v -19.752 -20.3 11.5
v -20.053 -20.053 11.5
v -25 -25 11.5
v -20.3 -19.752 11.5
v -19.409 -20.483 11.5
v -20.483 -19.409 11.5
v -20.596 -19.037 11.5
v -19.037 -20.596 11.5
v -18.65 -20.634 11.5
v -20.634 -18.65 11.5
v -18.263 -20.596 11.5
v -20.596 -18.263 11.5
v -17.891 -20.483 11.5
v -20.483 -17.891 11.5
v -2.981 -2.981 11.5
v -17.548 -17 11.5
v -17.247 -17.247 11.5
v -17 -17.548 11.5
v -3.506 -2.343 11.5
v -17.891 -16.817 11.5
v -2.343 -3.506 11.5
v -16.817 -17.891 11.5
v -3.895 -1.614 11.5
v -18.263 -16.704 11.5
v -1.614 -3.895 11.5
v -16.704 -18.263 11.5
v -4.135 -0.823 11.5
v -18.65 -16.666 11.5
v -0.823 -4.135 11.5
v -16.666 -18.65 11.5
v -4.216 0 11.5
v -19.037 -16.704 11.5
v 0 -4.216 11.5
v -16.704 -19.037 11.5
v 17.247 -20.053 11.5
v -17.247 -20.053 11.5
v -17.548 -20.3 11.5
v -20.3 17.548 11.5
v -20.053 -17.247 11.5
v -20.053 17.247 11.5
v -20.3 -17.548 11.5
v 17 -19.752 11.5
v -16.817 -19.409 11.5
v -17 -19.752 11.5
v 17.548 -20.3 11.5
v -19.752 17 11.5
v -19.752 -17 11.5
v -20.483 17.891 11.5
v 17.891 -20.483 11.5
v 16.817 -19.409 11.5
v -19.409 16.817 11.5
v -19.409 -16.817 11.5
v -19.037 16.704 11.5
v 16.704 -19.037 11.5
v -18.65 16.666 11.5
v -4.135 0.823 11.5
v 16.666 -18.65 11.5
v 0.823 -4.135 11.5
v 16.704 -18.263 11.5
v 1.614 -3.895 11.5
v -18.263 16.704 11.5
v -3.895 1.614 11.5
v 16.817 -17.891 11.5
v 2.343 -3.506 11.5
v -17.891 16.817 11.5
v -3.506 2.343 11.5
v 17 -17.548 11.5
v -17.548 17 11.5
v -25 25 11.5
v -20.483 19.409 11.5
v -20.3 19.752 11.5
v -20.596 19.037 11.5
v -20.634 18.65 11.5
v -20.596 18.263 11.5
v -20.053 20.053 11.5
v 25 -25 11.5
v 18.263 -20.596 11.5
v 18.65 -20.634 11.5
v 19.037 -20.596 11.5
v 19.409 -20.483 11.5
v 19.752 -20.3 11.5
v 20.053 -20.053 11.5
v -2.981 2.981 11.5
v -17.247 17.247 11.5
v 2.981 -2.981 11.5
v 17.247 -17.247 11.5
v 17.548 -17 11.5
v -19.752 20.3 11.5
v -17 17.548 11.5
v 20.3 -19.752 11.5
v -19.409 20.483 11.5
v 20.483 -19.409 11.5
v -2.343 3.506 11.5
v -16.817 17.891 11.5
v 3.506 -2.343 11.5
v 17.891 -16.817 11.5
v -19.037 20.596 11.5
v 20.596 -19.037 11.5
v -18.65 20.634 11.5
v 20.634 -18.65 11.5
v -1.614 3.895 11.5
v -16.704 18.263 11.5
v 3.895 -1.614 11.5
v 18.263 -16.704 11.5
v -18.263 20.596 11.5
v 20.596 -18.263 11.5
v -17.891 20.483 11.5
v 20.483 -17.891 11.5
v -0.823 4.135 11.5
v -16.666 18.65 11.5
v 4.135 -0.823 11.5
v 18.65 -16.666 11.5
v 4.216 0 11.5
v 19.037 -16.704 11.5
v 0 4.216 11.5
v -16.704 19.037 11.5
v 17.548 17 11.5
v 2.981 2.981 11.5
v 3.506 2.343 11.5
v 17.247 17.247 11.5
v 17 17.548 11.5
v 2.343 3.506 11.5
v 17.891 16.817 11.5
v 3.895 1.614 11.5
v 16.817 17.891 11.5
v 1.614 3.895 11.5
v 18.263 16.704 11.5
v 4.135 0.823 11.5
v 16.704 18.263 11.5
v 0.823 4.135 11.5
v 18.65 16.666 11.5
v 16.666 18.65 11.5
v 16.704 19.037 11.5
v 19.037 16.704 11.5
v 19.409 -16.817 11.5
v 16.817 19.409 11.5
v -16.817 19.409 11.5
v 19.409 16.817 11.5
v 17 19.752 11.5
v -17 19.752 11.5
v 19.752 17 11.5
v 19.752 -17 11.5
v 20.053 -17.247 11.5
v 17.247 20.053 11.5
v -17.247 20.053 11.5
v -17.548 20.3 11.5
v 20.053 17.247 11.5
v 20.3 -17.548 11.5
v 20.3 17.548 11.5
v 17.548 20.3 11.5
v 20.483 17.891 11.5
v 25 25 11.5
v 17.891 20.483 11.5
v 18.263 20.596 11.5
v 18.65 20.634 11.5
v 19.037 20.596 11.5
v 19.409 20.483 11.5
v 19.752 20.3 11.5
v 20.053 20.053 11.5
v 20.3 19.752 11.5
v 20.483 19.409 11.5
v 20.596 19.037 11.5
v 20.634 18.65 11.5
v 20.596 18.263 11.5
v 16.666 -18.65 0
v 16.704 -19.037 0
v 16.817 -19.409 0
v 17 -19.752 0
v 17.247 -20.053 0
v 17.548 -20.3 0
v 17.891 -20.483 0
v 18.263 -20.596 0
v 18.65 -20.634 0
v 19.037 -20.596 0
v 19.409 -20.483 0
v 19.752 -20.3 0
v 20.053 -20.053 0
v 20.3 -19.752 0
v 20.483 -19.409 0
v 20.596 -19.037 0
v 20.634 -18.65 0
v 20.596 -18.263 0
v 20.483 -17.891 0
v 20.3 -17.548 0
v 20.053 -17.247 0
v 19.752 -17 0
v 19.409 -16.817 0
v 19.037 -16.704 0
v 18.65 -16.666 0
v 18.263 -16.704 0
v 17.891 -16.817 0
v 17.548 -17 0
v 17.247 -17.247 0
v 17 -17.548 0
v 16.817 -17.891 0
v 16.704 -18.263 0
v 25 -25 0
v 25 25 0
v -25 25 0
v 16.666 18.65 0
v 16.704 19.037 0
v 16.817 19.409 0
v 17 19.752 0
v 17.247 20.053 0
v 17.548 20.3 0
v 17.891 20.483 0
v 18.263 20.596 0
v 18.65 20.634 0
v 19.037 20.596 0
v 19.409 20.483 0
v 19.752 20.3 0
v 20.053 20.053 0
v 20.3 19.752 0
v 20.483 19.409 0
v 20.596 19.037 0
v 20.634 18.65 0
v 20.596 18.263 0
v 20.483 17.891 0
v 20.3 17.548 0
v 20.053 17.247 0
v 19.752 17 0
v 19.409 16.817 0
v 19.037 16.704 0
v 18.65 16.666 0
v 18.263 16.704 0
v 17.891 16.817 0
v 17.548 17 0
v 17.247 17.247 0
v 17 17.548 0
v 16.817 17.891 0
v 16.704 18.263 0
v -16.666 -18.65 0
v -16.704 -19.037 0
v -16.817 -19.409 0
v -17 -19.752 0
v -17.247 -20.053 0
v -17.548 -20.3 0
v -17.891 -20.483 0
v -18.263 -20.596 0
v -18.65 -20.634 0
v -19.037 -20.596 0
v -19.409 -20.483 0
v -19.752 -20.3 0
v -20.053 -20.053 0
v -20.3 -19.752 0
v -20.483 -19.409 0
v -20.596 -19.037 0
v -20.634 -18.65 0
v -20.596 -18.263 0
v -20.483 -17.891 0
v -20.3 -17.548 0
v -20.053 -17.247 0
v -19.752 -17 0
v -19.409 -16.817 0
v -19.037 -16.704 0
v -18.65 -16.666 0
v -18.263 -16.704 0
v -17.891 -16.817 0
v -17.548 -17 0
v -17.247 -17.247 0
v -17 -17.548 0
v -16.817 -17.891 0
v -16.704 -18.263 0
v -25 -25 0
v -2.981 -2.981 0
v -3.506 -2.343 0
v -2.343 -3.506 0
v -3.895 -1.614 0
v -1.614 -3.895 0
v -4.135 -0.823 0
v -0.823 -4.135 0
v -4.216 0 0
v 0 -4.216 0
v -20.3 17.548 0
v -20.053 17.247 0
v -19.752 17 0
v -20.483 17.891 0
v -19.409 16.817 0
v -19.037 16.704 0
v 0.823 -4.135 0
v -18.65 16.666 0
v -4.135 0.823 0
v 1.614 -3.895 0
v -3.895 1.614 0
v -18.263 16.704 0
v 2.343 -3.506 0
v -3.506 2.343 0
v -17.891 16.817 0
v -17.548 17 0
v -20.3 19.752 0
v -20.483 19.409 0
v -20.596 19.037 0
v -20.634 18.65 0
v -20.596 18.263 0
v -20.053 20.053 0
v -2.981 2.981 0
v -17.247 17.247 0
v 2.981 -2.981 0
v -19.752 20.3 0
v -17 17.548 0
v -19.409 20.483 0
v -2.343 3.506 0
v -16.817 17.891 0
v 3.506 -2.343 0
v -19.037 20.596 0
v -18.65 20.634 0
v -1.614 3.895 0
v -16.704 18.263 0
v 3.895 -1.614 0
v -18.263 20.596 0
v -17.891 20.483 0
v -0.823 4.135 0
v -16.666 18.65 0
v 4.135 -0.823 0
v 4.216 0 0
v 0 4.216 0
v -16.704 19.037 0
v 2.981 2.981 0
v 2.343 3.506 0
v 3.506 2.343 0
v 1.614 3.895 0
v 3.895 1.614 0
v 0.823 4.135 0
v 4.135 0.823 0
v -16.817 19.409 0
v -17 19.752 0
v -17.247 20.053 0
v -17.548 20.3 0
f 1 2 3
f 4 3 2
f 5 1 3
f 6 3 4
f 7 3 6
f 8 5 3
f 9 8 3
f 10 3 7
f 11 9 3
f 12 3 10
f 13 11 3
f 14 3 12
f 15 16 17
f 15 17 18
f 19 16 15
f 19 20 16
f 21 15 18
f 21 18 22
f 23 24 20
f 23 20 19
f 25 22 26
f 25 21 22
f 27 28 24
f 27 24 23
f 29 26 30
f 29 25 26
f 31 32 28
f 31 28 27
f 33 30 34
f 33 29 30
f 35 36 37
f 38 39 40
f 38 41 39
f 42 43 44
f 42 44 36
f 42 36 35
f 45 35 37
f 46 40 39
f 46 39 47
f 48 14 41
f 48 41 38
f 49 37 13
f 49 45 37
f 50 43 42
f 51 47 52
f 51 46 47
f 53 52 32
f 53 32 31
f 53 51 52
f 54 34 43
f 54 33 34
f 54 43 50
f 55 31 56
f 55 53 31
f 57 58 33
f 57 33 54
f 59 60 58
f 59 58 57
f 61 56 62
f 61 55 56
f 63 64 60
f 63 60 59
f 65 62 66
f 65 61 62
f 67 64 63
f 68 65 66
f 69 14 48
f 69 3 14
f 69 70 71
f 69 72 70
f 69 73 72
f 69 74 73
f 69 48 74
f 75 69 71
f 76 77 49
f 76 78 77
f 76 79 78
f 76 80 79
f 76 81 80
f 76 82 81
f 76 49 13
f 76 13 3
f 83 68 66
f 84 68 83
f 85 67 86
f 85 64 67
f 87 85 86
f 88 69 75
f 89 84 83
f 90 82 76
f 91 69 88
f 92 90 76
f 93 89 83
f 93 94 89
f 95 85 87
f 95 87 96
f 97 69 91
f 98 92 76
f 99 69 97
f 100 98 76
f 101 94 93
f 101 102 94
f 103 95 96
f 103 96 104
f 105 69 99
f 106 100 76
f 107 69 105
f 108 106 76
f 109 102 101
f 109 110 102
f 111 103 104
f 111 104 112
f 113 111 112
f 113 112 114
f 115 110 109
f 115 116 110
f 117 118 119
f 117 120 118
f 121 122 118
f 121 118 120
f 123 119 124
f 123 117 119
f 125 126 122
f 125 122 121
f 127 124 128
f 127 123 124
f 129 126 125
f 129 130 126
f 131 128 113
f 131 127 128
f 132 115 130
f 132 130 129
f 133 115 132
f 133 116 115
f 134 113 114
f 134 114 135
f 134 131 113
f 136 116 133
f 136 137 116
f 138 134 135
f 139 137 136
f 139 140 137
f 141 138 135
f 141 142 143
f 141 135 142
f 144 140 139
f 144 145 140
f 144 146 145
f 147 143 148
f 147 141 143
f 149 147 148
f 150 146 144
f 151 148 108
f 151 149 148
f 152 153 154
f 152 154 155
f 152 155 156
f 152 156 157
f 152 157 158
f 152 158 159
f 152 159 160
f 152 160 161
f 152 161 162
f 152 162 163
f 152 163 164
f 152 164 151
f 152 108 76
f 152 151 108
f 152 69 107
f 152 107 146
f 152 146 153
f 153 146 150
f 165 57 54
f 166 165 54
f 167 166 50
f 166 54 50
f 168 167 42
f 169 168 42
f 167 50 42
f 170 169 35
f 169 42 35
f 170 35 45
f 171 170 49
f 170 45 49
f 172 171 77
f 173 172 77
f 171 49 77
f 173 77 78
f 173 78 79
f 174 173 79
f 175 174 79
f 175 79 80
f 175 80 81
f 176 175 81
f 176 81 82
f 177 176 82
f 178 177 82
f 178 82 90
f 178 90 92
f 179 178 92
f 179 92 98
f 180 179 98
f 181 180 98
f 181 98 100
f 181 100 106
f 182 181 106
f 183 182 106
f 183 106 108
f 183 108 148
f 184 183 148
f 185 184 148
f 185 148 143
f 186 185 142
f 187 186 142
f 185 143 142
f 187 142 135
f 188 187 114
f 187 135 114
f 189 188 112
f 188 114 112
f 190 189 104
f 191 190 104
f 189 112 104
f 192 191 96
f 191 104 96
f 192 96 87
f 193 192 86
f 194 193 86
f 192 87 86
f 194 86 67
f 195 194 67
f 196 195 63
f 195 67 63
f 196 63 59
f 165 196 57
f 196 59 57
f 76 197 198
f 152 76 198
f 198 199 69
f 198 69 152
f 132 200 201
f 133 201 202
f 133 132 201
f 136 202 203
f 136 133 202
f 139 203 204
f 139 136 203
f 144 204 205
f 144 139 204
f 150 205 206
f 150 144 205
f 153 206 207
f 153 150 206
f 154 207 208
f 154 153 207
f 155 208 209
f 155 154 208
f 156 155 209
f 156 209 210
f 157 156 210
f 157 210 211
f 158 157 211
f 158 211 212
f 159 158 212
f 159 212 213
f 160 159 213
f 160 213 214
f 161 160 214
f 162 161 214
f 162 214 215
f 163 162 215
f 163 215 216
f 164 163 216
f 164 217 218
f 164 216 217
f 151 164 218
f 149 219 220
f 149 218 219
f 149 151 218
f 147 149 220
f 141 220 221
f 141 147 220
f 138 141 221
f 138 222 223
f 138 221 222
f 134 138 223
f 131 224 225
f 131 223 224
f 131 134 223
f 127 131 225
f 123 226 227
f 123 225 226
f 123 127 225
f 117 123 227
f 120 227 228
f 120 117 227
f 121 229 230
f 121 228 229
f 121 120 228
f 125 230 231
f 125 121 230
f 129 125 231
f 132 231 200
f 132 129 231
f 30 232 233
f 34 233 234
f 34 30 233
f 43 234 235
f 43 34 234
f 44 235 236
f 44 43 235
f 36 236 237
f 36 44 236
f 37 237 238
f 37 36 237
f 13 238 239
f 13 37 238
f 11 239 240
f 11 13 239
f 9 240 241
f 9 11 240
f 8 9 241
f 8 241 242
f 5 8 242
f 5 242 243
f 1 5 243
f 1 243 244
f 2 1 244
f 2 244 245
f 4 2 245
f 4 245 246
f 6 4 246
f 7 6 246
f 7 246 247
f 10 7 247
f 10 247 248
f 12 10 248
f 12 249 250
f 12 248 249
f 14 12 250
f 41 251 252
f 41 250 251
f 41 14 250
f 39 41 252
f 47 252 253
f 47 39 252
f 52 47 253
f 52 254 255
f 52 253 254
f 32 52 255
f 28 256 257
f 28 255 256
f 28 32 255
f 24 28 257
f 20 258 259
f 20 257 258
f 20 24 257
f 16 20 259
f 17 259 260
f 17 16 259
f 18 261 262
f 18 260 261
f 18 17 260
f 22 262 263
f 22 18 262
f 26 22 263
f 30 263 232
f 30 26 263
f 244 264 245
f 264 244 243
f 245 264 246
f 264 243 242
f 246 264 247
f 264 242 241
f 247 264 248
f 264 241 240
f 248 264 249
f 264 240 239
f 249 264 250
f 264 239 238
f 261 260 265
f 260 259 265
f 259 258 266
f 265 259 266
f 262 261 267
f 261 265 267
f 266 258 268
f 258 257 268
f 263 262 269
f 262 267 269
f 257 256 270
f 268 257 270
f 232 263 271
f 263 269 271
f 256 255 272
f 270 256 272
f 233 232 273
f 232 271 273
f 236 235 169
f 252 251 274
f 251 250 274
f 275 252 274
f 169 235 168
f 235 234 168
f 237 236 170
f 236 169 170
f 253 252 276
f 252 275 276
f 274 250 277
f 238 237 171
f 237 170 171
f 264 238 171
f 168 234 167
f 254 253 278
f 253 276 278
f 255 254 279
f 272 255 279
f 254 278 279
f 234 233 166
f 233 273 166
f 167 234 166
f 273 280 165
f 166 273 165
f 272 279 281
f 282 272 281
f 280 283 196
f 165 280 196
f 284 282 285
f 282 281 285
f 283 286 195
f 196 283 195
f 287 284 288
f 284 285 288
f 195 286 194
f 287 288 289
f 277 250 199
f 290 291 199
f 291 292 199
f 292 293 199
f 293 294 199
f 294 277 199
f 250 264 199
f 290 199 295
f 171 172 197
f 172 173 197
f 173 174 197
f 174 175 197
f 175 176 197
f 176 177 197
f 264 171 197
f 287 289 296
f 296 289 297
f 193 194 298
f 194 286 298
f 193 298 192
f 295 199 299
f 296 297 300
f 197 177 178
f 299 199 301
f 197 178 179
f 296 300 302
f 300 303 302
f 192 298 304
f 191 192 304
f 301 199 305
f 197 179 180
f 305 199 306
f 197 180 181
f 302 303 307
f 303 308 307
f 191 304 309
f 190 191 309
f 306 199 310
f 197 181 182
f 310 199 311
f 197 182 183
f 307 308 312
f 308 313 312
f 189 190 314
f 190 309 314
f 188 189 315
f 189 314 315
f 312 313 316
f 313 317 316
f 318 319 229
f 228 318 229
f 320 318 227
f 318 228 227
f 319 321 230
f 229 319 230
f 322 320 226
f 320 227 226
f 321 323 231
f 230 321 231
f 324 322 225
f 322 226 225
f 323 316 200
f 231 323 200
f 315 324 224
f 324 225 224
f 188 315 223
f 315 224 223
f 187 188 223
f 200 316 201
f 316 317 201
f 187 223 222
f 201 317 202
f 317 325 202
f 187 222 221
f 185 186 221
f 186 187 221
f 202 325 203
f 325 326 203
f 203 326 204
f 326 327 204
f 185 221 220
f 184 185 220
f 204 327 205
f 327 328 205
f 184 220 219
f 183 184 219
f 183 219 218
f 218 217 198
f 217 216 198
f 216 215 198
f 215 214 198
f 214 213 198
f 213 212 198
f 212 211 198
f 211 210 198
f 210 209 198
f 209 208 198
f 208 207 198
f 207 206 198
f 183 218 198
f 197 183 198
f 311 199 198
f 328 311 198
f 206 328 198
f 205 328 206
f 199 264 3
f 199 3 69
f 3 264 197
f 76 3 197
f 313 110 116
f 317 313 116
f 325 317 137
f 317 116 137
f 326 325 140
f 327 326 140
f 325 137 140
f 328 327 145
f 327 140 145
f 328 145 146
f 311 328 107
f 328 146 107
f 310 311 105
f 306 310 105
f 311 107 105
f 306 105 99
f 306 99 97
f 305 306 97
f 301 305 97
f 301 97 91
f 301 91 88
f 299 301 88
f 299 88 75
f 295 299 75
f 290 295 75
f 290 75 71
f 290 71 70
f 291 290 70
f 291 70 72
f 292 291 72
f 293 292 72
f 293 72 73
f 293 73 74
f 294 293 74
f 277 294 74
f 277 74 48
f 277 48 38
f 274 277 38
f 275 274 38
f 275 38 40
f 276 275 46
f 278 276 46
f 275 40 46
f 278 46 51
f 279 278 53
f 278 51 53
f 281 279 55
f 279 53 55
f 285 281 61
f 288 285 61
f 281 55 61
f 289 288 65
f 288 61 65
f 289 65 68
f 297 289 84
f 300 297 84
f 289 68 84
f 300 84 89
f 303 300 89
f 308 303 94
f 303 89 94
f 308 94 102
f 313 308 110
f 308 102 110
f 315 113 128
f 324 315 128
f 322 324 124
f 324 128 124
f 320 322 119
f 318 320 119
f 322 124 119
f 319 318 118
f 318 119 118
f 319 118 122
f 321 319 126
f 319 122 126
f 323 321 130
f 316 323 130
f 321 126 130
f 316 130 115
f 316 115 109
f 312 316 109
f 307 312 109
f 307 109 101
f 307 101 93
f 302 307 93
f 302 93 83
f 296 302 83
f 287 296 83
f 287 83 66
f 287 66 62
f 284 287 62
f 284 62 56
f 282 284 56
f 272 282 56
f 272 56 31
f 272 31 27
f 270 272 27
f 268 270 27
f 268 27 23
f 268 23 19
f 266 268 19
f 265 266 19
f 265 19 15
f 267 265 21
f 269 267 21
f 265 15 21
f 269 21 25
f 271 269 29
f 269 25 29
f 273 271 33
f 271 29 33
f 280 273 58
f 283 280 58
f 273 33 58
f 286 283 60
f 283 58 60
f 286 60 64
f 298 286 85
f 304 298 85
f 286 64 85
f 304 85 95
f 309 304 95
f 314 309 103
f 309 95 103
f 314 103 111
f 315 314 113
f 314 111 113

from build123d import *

# Parameters (mm, degrees)
SKETCH1_W               = 50
SKETCH1_H               = 50
BOSS_EXTRUDE1_DEPTH     = 11.5
SKETCH2_R               = 1.984375
CUT_EXTRUDE1_DEPTH      = 12.5
MIRROR2_COPY_1_SKETCH_R = 1.984375
MIRROR2_COPY_1_DEPTH    = 12.5
SKETCH3_R               = 4.2164
CUT_EXTRUDE2_DEPTH      = 12.5


with BuildPart() as part:
    # Sketch1 → Boss-Extrude1 (new body)
    with BuildSketch(Plane.XY):
        Rectangle(SKETCH1_W, SKETCH1_H)
    extrude(amount=BOSS_EXTRUDE1_DEPTH)

    # Sketch2 → Cut-Extrude1 (cut, through all)
    with BuildSketch(Plane.XY.offset(11.5)):
        with Locations((-18.65, 18.65)):
            Circle(SKETCH2_R)
    cut_extrude1 = extrude(amount=-CUT_EXTRUDE1_DEPTH, mode=Mode.SUBTRACT)

    # Mirror1: Cut-Extrude1 across plane
    add(cut_extrude1.mirror(Plane.ZX), mode=Mode.SUBTRACT)

    # Mirror2: Cut-Extrude1 across plane
    add(cut_extrude1.mirror(Plane(origin=(0, 0, 0), x_dir=(0, 0, 1), z_dir=(1, 0, 0))), mode=Mode.SUBTRACT)

    # Mirror2 copy 1 sketch → Mirror2 copy 1 (cut, through all)
    with BuildSketch(Plane(origin=(0, 0, 11.5), x_dir=(-1, 0, 0), z_dir=(0, 0, 1))):
        with Locations((-18.65, 18.65)):
            Circle(MIRROR2_COPY_1_SKETCH_R)
    extrude(amount=-MIRROR2_COPY_1_DEPTH, mode=Mode.SUBTRACT)

    # Sketch3 → Cut-Extrude2 (cut, through all)
    with BuildSketch(Plane.XY.offset(11.5)):
        Circle(SKETCH3_R)
    extrude(amount=-CUT_EXTRUDE2_DEPTH, mode=Mode.SUBTRACT)


solid = part.part
